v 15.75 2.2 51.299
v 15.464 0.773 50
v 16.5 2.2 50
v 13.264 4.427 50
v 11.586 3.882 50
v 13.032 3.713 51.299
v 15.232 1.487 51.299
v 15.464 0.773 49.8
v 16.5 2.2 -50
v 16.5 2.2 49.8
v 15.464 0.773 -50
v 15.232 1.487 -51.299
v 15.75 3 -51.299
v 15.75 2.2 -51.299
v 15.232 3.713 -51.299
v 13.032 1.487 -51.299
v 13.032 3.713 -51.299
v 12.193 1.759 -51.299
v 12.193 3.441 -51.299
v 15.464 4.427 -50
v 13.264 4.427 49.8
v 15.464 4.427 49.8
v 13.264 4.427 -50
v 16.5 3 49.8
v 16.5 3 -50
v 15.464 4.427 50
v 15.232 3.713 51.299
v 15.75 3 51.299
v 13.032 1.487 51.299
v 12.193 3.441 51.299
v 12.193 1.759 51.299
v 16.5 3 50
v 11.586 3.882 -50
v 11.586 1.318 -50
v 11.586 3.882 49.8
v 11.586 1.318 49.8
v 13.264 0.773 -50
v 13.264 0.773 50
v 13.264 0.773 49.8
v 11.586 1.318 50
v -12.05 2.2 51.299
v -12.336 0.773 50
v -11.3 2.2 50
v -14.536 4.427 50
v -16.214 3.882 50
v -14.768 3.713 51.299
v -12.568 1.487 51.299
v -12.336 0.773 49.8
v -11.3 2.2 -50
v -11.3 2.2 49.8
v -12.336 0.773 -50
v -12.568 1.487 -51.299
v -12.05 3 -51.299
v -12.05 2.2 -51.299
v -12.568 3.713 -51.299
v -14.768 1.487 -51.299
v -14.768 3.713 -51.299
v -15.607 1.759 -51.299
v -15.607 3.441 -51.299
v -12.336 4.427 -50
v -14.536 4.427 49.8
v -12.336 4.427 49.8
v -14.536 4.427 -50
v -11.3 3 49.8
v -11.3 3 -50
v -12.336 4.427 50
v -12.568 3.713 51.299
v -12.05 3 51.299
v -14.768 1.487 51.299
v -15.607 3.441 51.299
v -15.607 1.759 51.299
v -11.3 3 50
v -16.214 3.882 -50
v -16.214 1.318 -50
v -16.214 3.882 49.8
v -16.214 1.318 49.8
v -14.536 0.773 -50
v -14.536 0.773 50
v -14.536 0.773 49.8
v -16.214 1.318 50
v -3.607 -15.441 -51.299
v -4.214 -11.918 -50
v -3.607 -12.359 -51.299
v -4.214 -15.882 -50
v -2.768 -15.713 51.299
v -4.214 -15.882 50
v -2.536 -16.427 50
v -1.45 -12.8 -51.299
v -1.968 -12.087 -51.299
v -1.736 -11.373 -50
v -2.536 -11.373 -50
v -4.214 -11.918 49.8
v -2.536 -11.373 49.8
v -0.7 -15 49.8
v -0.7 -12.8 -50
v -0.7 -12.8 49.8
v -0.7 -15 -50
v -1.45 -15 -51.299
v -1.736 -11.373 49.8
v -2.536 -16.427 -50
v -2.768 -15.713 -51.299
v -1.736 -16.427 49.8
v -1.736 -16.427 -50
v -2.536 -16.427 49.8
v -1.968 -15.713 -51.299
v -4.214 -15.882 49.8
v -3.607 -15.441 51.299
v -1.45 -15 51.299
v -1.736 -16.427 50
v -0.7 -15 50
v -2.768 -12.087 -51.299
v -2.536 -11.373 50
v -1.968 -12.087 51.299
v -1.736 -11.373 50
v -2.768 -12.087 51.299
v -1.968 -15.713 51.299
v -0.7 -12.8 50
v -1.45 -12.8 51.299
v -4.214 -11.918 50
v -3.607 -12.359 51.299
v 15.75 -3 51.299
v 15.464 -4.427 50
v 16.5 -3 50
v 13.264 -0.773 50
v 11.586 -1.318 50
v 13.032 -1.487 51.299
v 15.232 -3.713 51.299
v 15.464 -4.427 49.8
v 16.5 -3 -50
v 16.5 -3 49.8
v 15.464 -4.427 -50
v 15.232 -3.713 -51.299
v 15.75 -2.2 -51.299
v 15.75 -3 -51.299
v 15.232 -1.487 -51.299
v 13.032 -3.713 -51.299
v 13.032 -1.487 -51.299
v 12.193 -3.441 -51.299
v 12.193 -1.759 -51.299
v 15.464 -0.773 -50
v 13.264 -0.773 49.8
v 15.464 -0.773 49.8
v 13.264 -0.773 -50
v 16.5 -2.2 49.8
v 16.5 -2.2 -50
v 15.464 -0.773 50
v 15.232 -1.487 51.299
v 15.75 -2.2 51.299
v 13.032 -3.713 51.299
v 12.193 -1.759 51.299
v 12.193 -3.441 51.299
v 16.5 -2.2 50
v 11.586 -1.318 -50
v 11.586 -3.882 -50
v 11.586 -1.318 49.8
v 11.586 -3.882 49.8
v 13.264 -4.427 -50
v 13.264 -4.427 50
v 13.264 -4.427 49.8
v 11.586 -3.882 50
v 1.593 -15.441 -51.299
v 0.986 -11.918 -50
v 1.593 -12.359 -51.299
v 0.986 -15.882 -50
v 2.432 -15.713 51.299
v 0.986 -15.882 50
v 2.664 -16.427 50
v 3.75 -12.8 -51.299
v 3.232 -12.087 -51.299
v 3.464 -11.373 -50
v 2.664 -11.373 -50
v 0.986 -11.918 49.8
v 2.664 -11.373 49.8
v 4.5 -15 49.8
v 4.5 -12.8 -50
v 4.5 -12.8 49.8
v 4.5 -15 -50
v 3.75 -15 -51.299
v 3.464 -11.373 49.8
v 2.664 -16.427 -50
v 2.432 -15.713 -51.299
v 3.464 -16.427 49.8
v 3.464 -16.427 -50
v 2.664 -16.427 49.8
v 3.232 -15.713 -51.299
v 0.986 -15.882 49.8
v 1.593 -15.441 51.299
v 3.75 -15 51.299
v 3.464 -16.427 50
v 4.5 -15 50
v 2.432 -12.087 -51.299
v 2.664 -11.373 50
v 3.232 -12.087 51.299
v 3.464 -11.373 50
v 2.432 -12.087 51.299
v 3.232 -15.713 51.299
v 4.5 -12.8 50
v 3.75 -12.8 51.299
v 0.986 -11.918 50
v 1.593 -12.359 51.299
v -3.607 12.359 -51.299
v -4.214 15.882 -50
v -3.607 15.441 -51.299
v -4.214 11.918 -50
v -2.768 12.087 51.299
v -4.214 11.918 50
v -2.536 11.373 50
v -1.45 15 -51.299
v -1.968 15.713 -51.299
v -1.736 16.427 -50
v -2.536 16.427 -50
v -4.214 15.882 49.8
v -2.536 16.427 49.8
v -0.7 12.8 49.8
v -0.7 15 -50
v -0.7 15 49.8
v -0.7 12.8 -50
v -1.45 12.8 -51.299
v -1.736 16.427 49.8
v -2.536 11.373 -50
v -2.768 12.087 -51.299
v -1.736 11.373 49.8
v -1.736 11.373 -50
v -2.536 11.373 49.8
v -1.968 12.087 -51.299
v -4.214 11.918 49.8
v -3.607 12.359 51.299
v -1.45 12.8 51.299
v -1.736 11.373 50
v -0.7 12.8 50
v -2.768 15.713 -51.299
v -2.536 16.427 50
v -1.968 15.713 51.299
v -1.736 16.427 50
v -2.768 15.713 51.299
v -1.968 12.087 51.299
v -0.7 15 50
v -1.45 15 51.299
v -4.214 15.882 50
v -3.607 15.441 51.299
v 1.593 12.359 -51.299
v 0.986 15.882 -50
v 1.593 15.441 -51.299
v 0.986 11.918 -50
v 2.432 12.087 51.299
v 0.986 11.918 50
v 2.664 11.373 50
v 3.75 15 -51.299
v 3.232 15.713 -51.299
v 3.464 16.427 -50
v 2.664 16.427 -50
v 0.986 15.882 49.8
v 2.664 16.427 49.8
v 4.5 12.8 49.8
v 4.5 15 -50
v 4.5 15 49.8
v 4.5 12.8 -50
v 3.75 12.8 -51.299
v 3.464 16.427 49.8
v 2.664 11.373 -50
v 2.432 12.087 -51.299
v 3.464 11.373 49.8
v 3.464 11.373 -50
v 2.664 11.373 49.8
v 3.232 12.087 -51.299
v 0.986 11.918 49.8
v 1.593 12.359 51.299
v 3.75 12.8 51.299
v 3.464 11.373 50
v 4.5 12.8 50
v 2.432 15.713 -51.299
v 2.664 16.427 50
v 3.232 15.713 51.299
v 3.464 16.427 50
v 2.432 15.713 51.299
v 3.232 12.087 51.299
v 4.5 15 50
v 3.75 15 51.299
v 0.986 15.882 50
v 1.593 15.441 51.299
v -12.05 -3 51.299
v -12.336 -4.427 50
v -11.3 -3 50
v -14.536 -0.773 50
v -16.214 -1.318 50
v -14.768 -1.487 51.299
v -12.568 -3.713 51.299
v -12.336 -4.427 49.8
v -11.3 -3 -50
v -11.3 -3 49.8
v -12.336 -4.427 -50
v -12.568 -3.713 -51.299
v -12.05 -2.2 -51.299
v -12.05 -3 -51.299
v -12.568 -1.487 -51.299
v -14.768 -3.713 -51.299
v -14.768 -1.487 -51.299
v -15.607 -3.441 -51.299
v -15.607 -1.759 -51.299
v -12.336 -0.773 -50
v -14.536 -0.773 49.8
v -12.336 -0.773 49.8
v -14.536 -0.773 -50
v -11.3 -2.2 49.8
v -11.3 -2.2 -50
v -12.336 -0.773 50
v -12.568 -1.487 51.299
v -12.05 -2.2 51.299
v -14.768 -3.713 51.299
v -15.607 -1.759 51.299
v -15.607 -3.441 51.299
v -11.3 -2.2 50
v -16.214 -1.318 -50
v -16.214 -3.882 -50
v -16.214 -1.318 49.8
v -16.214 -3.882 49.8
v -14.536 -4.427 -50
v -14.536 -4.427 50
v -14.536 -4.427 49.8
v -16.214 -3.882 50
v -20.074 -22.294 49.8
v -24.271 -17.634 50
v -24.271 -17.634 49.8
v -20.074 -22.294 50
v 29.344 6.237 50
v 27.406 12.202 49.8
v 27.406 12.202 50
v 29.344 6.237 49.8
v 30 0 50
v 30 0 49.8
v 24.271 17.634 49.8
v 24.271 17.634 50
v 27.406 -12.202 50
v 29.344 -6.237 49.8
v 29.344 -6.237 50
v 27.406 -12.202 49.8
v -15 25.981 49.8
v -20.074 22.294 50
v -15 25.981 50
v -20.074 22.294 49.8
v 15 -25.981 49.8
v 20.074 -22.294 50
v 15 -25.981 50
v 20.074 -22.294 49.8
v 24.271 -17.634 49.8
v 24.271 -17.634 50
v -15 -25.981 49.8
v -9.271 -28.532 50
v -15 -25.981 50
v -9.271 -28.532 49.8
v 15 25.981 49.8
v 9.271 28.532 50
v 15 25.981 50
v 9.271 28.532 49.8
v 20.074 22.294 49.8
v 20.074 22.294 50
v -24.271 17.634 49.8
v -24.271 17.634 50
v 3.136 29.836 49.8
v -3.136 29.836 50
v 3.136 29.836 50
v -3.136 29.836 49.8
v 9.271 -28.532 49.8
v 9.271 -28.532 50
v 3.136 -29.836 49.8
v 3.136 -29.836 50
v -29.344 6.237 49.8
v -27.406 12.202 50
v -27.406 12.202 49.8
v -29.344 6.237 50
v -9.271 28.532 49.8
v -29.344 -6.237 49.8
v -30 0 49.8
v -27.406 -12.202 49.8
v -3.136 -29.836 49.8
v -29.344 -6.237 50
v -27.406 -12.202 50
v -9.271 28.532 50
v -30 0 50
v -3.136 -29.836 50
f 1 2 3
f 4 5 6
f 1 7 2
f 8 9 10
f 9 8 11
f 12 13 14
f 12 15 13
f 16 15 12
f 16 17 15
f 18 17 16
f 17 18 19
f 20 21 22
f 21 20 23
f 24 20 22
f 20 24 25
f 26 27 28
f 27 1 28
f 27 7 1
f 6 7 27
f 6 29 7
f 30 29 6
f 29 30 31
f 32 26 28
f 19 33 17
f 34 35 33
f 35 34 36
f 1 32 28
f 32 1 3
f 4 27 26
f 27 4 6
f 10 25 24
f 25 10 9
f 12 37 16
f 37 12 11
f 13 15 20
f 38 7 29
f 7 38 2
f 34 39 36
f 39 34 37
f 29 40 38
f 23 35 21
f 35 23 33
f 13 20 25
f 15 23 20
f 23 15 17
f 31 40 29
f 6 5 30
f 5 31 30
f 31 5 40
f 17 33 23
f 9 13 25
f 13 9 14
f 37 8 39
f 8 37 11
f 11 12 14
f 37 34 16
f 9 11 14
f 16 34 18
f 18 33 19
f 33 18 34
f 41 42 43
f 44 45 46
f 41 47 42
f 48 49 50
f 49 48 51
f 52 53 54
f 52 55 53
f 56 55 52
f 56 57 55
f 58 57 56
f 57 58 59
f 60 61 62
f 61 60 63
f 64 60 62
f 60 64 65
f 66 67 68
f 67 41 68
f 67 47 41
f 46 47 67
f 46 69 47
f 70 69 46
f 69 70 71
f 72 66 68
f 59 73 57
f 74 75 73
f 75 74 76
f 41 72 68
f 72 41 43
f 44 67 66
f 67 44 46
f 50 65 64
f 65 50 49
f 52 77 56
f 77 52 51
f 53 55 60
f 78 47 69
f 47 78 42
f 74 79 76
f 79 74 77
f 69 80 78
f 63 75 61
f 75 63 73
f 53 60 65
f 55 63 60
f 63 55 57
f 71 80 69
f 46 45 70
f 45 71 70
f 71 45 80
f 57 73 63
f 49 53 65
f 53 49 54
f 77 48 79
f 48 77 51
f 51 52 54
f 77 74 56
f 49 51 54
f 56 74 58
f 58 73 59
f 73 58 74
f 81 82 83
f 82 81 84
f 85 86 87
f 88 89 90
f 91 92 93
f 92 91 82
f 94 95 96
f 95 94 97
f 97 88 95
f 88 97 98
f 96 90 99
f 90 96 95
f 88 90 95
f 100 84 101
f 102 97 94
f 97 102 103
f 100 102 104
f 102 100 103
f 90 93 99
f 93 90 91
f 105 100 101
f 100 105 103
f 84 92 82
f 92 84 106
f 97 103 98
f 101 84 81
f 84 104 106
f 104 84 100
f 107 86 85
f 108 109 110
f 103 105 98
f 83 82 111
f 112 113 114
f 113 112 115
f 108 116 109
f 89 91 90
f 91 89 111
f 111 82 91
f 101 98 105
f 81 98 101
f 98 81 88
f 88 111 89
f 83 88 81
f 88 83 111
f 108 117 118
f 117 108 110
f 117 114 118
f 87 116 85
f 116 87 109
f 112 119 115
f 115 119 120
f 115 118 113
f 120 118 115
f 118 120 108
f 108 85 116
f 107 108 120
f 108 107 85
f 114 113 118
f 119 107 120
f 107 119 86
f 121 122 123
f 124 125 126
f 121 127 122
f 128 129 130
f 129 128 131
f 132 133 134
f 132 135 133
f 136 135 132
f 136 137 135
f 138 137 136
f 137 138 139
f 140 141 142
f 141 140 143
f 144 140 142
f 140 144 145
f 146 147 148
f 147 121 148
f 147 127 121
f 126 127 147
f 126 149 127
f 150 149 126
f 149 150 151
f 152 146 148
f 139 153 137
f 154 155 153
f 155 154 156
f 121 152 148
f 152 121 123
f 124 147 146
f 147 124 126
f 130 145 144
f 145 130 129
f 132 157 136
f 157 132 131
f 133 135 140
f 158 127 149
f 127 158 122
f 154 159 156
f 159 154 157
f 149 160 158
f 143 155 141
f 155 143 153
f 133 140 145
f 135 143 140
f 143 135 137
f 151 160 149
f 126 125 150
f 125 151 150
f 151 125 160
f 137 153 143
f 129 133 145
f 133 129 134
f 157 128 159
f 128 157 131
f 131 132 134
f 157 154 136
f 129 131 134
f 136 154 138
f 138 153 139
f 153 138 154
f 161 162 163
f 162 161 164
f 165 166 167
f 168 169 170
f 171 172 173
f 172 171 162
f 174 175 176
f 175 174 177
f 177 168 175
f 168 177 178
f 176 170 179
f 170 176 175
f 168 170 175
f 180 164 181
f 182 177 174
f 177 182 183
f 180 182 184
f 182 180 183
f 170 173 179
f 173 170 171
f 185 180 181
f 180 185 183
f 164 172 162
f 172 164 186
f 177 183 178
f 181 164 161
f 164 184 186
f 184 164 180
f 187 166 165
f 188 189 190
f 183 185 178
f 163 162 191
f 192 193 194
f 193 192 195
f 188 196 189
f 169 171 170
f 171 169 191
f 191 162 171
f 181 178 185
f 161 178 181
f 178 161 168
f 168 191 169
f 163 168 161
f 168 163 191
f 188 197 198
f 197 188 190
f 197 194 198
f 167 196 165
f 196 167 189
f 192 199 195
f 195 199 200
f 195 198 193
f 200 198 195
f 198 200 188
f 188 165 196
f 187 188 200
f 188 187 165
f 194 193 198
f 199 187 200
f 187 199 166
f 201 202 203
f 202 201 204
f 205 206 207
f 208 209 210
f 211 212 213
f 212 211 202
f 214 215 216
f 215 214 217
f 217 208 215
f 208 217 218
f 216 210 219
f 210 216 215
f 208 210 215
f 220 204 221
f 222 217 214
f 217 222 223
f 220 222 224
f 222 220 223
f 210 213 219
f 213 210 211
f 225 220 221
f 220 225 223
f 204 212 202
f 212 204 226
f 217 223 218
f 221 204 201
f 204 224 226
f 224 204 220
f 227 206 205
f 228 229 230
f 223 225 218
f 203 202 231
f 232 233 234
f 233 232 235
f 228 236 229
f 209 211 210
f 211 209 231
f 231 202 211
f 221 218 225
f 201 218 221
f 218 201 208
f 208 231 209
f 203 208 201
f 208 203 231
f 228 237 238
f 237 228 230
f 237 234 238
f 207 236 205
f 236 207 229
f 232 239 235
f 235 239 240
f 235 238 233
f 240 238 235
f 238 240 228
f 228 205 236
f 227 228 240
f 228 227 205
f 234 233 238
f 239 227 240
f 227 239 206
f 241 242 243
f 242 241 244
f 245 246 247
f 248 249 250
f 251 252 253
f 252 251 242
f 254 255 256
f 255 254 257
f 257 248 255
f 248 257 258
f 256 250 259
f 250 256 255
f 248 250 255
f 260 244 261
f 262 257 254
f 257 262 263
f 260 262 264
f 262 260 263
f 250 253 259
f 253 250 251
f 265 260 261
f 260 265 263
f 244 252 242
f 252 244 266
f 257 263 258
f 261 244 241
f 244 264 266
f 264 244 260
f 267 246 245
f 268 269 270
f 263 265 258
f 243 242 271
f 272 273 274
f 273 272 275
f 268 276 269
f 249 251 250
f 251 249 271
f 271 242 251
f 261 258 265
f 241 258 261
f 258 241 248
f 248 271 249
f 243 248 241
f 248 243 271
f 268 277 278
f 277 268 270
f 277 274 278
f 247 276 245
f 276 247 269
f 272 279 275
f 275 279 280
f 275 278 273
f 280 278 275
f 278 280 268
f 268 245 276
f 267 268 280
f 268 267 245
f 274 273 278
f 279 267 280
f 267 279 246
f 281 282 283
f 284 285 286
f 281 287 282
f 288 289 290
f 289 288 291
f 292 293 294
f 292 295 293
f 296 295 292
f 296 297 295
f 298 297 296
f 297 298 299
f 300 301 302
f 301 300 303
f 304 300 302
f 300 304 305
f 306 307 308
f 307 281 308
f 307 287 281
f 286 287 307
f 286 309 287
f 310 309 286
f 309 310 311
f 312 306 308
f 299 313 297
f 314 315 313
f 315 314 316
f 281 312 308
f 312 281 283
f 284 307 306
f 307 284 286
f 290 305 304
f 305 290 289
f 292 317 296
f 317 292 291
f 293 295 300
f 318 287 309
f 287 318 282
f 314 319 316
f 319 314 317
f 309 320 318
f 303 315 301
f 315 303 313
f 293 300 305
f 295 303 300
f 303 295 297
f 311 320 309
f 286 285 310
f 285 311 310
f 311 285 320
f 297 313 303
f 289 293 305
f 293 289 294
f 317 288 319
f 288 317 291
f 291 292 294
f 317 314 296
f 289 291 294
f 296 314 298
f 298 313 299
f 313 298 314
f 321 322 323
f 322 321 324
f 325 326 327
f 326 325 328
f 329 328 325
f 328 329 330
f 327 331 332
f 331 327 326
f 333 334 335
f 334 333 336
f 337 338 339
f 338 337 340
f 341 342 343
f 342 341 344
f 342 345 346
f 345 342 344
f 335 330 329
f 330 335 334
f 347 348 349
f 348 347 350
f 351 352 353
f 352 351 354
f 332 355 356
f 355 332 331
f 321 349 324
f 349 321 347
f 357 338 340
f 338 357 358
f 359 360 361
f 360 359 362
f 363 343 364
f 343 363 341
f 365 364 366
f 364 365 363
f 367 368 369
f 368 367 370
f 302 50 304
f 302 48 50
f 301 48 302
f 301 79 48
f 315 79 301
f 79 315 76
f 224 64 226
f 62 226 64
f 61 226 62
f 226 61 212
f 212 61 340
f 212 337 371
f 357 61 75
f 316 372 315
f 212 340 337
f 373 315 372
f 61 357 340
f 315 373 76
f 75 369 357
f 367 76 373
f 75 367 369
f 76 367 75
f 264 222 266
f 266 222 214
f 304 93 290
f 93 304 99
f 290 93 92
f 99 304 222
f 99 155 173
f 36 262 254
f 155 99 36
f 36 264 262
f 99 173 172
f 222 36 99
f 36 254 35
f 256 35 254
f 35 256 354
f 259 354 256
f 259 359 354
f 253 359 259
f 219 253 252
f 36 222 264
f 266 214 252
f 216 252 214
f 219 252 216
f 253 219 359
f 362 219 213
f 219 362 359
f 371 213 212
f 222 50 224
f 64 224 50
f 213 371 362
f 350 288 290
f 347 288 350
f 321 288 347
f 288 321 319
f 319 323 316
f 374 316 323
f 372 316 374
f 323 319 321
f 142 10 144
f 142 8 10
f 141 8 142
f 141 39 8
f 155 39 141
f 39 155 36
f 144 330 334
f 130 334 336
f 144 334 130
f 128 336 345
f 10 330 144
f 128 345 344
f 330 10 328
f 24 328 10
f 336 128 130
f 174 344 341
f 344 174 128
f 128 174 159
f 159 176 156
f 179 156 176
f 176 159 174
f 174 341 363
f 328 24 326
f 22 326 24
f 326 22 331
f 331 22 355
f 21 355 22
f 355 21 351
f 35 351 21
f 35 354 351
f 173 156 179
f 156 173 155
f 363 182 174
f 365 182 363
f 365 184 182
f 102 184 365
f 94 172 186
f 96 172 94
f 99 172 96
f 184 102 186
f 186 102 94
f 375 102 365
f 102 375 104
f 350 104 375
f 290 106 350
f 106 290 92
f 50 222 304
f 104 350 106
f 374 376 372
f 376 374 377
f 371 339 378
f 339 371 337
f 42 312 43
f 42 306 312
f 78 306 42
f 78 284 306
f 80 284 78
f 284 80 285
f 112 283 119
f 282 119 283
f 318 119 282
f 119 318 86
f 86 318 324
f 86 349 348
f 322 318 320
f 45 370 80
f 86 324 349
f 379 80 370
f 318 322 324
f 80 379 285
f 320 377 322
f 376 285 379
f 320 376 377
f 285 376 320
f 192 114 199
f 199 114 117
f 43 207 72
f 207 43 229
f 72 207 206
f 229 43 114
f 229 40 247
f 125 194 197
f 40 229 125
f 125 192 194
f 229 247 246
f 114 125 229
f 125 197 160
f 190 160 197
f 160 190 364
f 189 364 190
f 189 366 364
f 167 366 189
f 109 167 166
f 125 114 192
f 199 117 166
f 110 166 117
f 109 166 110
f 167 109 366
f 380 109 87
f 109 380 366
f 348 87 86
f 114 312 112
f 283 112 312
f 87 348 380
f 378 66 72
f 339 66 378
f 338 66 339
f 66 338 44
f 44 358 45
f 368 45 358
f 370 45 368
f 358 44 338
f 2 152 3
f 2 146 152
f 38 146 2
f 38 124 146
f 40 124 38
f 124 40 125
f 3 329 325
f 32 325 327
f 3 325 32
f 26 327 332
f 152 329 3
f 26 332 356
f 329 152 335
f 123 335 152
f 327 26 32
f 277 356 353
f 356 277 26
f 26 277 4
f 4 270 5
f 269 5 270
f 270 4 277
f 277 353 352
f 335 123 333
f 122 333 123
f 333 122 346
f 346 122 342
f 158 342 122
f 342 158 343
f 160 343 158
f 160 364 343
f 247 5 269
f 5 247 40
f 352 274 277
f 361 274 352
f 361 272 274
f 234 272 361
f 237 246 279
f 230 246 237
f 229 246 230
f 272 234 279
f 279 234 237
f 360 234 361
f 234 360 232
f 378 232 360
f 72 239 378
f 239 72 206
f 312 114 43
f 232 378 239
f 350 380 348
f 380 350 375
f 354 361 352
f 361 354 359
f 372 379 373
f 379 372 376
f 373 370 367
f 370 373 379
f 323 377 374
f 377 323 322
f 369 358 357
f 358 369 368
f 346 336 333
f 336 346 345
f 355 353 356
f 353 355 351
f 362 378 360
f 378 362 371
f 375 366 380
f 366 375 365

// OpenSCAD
// Parameters
profile_W = 30; //[15:60:0.5]
profile_H = 30; //[15:60:0.5]
length_L = 100; //[50:200:1]
center_bore_d = 5; //[2:12:0.5]
slot_count = 4; //[1:8:1]
slot_opening_w = 6; //[3:12:0.5]
slot_depth = 8; //[4:16:0.5]
slot_neck_w = 3; //[1.5:8:0.5]
wall_t = 2; //[1:5:0.25]
chamfer_c = 1; //[0:3:0.25]
corner_r = 1.5; //[0:4:0.25]
lip_t = 0.8; //[0.2:2:0.1]
lip_inset = 1.2; //[0.2:4:0.1]
texture_depth = 0.2; //[0:0.8:0.05]
overlap_eps = 1; //[0.5:2:0.1]

// Base Shapes
module extrusion_body() {
  translate([0, 0, 0])
    cube([profile_W, profile_H, length_L], center=true);
}

module center_bore() {
  translate([0, 0, 0])
    cylinder(h=length_L + 2*overlap_eps, r=center_bore_d/2, center=true);
}

module t_slot_cut_posX() {
  linear_extrude(height=length_L + 2*overlap_eps, center=true)
    polygon(points=[
      [profile_W/2 - slot_depth - overlap_eps, -slot_opening_w/2],
      [profile_W/2 + overlap_eps, -slot_opening_w/2],
      [profile_W/2 + overlap_eps, slot_opening_w/2],
      [profile_W/2 - slot_depth - overlap_eps, slot_opening_w/2],
      [profile_W/2 - slot_depth - overlap_eps, slot_neck_w/2],
      [profile_W/2 - slot_depth/2, slot_neck_w/2],
      [profile_W/2 - slot_depth/2, -slot_neck_w/2],
      [profile_W/2 - slot_depth - overlap_eps, -slot_neck_w/2]
    ]);
}

module t_slot_cut_negX() {
  linear_extrude(height=length_L + 2*overlap_eps, center=true)
    polygon(points=[
      [-profile_W/2 + slot_depth + overlap_eps, -slot_opening_w/2],
      [-profile_W/2 - overlap_eps, -slot_opening_w/2],
      [-profile_W/2 - overlap_eps, slot_opening_w/2],
      [-profile_W/2 + slot_depth + overlap_eps, slot_opening_w/2],
      [-profile_W/2 + slot_depth + overlap_eps, slot_neck_w/2],
      [-profile_W/2 + slot_depth/2, slot_neck_w/2],
      [-profile_W/2 + slot_depth/2, -slot_neck_w/2],
      [-profile_W/2 + slot_depth + overlap_eps, -slot_neck_w/2]
    ]);
}

module t_slot_cut_posY() {
  linear_extrude(height=length_L + 2*overlap_eps, center=true)
    polygon(points=[
      [-slot_opening_w/2, profile_H/2 - slot_depth - overlap_eps],
      [-slot_opening_w/2, profile_H/2 + overlap_eps],
      [slot_opening_w/2, profile_H/2 + overlap_eps],
      [slot_opening_w/2, profile_H/2 - slot_depth - overlap_eps],
      [slot_neck_w/2, profile_H/2 - slot_depth - overlap_eps],
      [slot_neck_w/2, profile_H/2 - slot_depth/2],
      [-slot_neck_w/2, profile_H/2 - slot_depth/2],
      [-slot_neck_w/2, profile_H/2 - slot_depth - overlap_eps]
    ]);
}

module t_slot_cut_negY() {
  linear_extrude(height=length_L + 2*overlap_eps, center=true)
    polygon(points=[
      [-slot_opening_w/2, -profile_H/2 + slot_depth + overlap_eps],
      [-slot_opening_w/2, -profile_H/2 - overlap_eps],
      [slot_opening_w/2, -profile_H/2 - overlap_eps],
      [slot_opening_w/2, -profile_H/2 + slot_depth + overlap_eps],
      [slot_neck_w/2, -profile_H/2 + slot_depth + overlap_eps],
      [slot_neck_w/2, -profile_H/2 + slot_depth/2],
      [-slot_neck_w/2, -profile_H/2 + slot_depth/2],
      [-slot_neck_w/2, -profile_H/2 + slot_depth + overlap_eps]
    ]);
}

module edge_chamfers() {
  linear_extrude(height=length_L + 2*overlap_eps, center=true)
    polygon(points=[
      [-profile_W/2 - overlap_eps, -profile_H/2 - overlap_eps],
      [-profile_W/2 - overlap_eps, -profile_H/2 + chamfer_c],
      [-profile_W/2 + chamfer_c, -profile_H/2 - overlap_eps],
      [profile_W/2 - chamfer_c, -profile_H/2 - overlap_eps],
      [profile_W/2 + overlap_eps, -profile_H/2 + chamfer_c],
      [profile_W/2 + overlap_eps, -profile_H/2 - overlap_eps],
      [profile_W/2 + overlap_eps, profile_H/2 + overlap_eps],
      [profile_W/2 + overlap_eps, profile_H/2 - chamfer_c],
      [profile_W/2 - chamfer_c, profile_H/2 + overlap_eps],
      [-profile_W/2 + chamfer_c, profile_H/2 + overlap_eps],
      [-profile_W/2 - overlap_eps, profile_H/2 - chamfer_c],
      [-profile_W/2 - overlap_eps, profile_H/2 + overlap_eps]
    ]);
}

module manufacturer_specific_slot_lips_posX() {
  translate([profile_W/2 - (lip_inset + overlap_eps)/2, slot_opening_w/2 - lip_t/2, 0])
    cube([lip_inset + overlap_eps, lip_t, length_L], center=true);
}

module manufacturer_specific_slot_lips_posX_mirror() {
  translate([profile_W/2 - (lip_inset + overlap_eps)/2, -slot_opening_w/2 + lip_t/2, 0])
    cube([lip_inset + overlap_eps, lip_t, length_L], center=true);
}

module manufacturer_specific_slot_lips_negX() {
  translate([-profile_W/2 + (lip_inset + overlap_eps)/2, slot_opening_w/2 - lip_t/2, 0])
    cube([lip_inset + overlap_eps, lip_t, length_L], center=true);
}

module manufacturer_specific_slot_lips_negX_mirror() {
  translate([-profile_W/2 + (lip_inset + overlap_eps)/2, -slot_opening_w/2 + lip_t/2, 0])
    cube([lip_inset + overlap_eps, lip_t, length_L], center=true);
}

module manufacturer_specific_slot_lips_posY() {
  translate([slot_opening_w/2 - lip_t/2, profile_H/2 - (lip_inset + overlap_eps)/2, 0])
    cube([lip_t, lip_inset + overlap_eps, length_L], center=true);
}

module manufacturer_specific_slot_lips_posY_mirror() {
  translate([-slot_opening_w/2 + lip_t/2, profile_H/2 - (lip_inset + overlap_eps)/2, 0])
    cube([lip_t, lip_inset + overlap_eps, length_L], center=true);
}

module manufacturer_specific_slot_lips_negY() {
  translate([slot_opening_w/2 - lip_t/2, -profile_H/2 + (lip_inset + overlap_eps)/2, 0])
    cube([lip_t, lip_inset + overlap_eps, length_L], center=true);
}

module manufacturer_specific_slot_lips_negY_mirror() {
  translate([-slot_opening_w/2 + lip_t/2, -profile_H/2 + (lip_inset + overlap_eps)/2, 0])
    cube([lip_t, lip_inset + overlap_eps, length_L], center=true);
}

module corner_radii_kernel() {
  sphere(r=corner_r);
}

module surface_finish_texture() {
  translate([0, 0, length_L/2 - texture_depth/2])
    cylinder(h=texture_depth, r=max(profile_W, profile_H), center=true);
}

// Operations
module t_slot_channels() {
  union() {
    t_slot_cut_posX();
    t_slot_cut_negX();
    t_slot_cut_posY();
    t_slot_cut_negY();
  }
}

module extrusion_minus_bore() {
  difference() {
    extrusion_body();
    center_bore();
  }
}

module extrusion_minus_slots() {
  difference() {
    extrusion_minus_bore();
    t_slot_channels();
  }
}

module extrusion_minus_chamfers() {
  difference() {
    extrusion_minus_slots();
    edge_chamfers();
  }
}

module extrusion_with_lips() {
  union() {
    extrusion_minus_chamfers();
    manufacturer_specific_slot_lips_posX();
    manufacturer_specific_slot_lips_posX_mirror();
    manufacturer_specific_slot_lips_negX();
    manufacturer_specific_slot_lips_negX_mirror();
    manufacturer_specific_slot_lips_posY();
    manufacturer_specific_slot_lips_posY_mirror();
    manufacturer_specific_slot_lips_negY();
    manufacturer_specific_slot_lips_negY_mirror();
  }
}

module corner_radii() {
  minkowski() {
    extrusion_with_lips();
    corner_radii_kernel();
  }
}

module final_model() {
  union() {
    corner_radii();
    surface_finish_texture();
  }
}

// Render the final model
final_model();
